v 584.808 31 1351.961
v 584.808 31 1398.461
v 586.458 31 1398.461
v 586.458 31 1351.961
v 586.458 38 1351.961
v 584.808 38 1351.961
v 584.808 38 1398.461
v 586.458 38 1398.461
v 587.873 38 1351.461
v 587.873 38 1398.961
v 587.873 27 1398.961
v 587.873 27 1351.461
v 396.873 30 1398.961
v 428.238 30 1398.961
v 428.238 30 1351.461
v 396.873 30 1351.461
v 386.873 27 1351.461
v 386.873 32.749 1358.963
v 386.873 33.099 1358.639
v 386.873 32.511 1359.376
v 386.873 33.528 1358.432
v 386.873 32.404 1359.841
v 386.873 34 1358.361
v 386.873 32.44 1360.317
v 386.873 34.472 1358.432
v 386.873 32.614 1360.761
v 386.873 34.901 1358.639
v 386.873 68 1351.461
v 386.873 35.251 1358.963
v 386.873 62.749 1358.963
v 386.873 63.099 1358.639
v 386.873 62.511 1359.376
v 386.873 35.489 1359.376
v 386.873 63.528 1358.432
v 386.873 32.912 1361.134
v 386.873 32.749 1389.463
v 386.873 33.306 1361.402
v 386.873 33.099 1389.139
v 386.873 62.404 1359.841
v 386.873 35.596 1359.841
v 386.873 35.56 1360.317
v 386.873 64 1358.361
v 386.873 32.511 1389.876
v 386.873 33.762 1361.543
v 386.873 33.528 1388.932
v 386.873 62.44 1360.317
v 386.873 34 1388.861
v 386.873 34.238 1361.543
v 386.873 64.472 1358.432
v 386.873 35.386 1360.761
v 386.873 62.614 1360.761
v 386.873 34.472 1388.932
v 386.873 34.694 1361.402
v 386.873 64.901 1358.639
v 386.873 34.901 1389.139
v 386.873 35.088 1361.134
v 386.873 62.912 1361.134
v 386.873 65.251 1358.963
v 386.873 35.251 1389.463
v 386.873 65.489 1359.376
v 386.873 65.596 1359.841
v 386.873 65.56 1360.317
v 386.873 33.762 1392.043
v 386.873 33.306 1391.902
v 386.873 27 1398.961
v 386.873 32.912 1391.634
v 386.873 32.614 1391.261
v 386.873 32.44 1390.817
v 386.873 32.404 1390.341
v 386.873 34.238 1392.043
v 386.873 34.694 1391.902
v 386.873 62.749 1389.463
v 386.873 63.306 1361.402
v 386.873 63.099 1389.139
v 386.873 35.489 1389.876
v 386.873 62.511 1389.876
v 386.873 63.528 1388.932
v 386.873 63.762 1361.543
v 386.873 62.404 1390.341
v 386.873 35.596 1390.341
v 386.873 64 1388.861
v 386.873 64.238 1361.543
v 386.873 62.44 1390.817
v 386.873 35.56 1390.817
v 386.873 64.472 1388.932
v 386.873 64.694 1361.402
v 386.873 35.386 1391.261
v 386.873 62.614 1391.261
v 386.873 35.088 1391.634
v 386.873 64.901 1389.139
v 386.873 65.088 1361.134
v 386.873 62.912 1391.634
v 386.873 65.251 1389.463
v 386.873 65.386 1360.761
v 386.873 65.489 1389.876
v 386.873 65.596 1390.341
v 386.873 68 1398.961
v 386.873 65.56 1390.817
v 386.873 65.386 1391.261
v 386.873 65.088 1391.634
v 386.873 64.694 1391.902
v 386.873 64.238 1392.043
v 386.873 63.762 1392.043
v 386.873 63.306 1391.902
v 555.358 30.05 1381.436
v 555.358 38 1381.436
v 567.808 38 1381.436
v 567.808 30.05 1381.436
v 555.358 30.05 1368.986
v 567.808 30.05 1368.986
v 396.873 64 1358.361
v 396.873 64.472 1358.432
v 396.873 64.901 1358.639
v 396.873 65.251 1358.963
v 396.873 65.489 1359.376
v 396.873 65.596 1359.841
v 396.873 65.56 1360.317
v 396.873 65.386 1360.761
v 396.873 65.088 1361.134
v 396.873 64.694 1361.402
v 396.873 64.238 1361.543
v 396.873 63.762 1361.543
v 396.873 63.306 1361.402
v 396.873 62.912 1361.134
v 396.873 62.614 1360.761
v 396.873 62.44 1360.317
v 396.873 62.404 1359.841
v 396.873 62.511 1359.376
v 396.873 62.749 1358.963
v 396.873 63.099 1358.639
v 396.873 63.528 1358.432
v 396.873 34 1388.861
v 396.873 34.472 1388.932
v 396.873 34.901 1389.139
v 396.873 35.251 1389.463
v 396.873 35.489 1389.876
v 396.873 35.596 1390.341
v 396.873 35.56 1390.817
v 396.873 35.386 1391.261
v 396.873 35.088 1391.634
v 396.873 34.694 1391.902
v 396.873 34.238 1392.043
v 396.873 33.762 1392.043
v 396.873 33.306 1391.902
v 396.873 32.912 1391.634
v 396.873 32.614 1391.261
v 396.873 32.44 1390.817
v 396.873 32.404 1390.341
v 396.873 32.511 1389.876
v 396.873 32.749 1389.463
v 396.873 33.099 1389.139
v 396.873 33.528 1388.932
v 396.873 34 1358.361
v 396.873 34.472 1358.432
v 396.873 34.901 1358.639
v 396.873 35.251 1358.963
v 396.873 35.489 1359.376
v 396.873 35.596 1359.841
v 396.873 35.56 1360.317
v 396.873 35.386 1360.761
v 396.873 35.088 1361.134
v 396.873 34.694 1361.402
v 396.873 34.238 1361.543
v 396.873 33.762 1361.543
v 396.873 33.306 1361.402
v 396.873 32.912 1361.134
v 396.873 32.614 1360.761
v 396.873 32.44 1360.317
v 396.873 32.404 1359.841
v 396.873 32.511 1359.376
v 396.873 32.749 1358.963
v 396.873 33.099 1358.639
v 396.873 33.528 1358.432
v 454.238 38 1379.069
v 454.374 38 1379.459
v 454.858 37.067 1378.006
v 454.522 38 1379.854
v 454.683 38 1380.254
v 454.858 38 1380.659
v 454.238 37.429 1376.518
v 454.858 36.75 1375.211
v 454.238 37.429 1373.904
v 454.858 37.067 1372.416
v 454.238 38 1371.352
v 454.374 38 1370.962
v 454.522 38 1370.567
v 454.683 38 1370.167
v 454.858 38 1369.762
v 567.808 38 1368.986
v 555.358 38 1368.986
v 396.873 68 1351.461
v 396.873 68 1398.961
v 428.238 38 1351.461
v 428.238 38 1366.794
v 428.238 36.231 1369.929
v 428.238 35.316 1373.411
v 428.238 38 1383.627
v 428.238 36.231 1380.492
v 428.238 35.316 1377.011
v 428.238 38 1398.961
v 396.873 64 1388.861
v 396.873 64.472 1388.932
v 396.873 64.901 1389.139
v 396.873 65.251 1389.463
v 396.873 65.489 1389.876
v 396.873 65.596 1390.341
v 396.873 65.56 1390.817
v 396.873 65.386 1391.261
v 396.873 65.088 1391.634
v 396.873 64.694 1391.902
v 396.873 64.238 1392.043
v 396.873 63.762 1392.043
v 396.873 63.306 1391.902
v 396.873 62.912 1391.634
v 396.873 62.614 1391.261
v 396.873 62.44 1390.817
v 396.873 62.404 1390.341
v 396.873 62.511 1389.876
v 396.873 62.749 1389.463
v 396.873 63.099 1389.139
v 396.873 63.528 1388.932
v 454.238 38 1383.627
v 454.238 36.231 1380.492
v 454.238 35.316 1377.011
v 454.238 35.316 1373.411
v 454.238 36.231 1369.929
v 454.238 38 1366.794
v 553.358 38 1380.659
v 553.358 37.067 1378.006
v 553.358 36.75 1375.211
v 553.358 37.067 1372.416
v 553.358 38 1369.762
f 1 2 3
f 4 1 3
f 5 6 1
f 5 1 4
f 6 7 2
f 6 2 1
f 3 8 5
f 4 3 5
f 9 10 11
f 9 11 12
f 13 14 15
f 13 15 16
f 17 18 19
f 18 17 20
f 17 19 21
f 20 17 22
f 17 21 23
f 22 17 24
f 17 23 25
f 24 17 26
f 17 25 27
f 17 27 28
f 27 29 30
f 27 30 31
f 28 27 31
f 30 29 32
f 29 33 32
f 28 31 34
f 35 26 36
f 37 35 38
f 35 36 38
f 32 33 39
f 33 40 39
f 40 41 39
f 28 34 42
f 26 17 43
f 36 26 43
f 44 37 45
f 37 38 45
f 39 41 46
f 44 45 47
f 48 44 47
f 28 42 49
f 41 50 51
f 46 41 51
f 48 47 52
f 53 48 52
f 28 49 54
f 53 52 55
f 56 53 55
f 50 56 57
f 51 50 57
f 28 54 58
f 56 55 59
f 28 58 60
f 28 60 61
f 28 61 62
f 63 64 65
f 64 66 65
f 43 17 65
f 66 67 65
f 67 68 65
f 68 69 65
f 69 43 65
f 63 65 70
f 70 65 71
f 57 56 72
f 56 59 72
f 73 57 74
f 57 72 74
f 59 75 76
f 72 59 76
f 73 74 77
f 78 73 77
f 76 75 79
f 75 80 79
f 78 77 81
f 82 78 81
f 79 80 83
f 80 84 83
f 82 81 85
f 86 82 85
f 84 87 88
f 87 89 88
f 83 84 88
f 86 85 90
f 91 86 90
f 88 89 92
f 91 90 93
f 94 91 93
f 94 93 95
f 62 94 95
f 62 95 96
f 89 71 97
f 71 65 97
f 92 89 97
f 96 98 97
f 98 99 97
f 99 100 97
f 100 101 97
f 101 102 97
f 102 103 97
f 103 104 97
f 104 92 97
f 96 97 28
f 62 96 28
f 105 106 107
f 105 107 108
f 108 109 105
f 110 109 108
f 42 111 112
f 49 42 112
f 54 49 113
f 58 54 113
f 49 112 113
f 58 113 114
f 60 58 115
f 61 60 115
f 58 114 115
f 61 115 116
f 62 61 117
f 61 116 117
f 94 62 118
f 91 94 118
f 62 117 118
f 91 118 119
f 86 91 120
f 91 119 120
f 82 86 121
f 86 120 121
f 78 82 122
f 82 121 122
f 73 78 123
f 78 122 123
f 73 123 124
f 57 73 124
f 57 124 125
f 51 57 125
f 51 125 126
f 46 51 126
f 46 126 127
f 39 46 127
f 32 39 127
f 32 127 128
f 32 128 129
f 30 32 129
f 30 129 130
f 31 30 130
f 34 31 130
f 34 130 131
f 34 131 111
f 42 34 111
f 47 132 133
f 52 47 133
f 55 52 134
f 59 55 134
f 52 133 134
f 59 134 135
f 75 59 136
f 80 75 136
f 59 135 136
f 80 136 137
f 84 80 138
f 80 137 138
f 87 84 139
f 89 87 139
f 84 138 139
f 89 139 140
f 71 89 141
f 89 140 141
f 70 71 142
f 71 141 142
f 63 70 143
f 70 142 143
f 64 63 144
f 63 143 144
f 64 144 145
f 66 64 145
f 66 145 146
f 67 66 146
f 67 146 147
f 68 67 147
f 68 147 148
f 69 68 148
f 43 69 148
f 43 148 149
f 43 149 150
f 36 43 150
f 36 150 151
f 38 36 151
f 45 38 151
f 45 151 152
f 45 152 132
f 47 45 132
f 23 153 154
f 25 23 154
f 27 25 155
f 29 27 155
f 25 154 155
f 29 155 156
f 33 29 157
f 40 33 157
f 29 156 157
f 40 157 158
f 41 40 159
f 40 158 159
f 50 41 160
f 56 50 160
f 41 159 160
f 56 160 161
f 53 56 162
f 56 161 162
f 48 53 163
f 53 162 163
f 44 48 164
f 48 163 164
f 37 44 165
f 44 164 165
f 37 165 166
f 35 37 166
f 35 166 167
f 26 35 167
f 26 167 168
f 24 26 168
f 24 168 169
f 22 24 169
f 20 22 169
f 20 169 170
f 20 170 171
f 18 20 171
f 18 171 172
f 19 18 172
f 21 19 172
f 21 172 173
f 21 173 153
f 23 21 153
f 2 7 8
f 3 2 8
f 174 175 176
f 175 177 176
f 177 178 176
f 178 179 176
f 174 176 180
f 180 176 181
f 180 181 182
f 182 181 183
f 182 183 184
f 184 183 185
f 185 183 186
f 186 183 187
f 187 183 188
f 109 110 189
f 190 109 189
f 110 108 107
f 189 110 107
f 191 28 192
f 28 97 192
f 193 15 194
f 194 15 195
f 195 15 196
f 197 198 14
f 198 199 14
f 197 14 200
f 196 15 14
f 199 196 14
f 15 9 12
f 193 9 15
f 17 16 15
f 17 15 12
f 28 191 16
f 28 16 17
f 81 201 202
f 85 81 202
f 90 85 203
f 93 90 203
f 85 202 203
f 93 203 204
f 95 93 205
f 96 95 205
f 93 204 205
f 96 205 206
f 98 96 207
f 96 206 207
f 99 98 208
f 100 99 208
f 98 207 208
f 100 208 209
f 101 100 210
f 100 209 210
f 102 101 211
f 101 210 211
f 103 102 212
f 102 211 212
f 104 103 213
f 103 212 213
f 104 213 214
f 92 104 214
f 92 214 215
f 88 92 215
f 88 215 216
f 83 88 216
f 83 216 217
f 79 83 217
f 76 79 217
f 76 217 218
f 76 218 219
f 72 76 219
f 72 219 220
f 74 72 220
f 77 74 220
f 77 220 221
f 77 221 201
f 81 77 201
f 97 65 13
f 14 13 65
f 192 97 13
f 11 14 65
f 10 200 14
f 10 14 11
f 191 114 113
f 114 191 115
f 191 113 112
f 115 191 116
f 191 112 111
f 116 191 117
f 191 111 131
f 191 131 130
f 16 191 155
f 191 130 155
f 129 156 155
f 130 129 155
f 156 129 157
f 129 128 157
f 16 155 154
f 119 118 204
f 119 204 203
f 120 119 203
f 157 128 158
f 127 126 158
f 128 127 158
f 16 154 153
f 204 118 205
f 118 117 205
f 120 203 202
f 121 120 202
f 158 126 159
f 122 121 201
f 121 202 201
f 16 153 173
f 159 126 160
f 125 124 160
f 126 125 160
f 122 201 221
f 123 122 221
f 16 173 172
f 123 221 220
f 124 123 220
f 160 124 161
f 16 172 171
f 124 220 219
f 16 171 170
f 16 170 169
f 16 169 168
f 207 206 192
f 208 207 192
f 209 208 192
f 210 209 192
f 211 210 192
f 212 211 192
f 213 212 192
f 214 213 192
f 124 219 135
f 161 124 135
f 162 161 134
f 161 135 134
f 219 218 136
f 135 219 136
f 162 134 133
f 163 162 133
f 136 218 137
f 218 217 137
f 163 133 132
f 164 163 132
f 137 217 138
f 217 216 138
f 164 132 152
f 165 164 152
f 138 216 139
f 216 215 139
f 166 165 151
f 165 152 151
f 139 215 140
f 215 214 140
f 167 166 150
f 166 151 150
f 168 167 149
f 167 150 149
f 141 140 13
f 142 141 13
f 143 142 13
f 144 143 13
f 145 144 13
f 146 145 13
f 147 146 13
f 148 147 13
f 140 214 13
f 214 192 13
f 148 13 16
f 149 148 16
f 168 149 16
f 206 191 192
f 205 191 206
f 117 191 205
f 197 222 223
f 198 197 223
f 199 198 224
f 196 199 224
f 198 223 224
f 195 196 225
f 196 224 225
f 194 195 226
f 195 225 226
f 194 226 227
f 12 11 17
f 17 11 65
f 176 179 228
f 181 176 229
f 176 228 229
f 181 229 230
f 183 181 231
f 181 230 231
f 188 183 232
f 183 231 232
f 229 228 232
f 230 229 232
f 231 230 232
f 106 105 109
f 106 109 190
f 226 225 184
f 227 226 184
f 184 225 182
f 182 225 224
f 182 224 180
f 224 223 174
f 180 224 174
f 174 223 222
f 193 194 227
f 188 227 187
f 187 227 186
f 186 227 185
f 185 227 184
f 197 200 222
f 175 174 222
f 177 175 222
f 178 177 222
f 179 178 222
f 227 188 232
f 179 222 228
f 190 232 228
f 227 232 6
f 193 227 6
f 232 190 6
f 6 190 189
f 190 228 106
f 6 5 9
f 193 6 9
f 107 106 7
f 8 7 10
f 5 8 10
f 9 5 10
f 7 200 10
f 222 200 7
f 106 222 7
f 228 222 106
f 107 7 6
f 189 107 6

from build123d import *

# Parameters (mm, degrees)
SKETCH1_W               = 226
SKETCH1_H               = 84
BOSS_EXTRUDE1_DEPTH     = 20
SKETCH9_W               = 215
SKETCH9_H               = 38.50000016
BOSS_EXTRUDE2_DEPTH     = 10
SKETCH12_W              = 10
SKETCH12_H              = 38.50000016
BOSS_EXTRUDE4_DEPTH     = 38
SKETCH14_R              = 1.6
CUT_EXTRUDE2_DEPTH      = 38
SKETCH18_W              = 173.6342166
SKETCH18_H              = 38.50000016
BOSS_EXTRUDE5_DEPTH     = 8
SKETCH20_W              = 226
SKETCH20_H              = 20
BOSS_EXTRUDE6_DEPTH     = 27.35
SKETCH20_4_W            = 226
SKETCH20_4_H            = 20
CUT_EXTRUDE3_DEPTH      = 27.35
SKETCH22_W              = 226
SKETCH22_H              = 20
CUT_EXTRUDE4_DEPTH      = 18.14670137
SKETCH23_W              = 38.50329863
SKETCH23_H              = 20
CUT_EXTRUDE5_DEPTH      = 11
SKETCH24_W              = 215
SKETCH24_H              = 38.50329863
CUT_EXTRUDE6_DEPTH      = 27
SKETCH27_W              = 31.3657834
SKETCH27_H              = 3
BOSS_EXTRUDE8_DEPTH     = 4.5
SKETCH28_W              = 31.3657834
SKETCH28_H              = 3
BOSS_EXTRUDE9_DEPTH     = 4.5
CUT_EXTRUDE9_DEPTH      = 5
CUT_EXTRUDE9_DEPTH_BACK = 14
SKETCH30_W              = 47.50000016
SKETCH30_H              = 11
CAVITY2_START           = 555.357736953
CAVITY2_DEPTH           = 12.45
CAVITY2_2_OUTLINE_W     = 9.75
CAVITY2_2_OUTLINE_H     = 10.05
CAVITY2_2_DEPTH         = 1.2
CAVITY2_START_2         = 566.607736953
CAVITY2_3_OUTLINE_W     = 9.75
CAVITY2_3_OUTLINE_H     = 10.05
CAVITY2_3_DEPTH         = 1.2
SKETCH32_W              = 10.05
SKETCH32_H              = 10.05
CUT_EXTRUDE14_DEPTH     = 10
SKETCH34_W              = 12.45
SKETCH34_H              = 12.45
BOSS_EXTRUDE11_DEPTH    = 3
SKETCH35_W              = 1.65
SKETCH35_H              = 46.5
CUT_EXTRUDE15_DEPTH     = 7


# Read off the part's stored shape, not the designer's step: Cavity2
with BuildPart() as part:
    # Sketch1 → Boss-Extrude1 (new body)
    with BuildSketch(Plane(origin=(375.872687737, 0, 1298.443562055), x_dir=(1, 0, 0), z_dir=(0, 1, 0))):
        with Locations((113, -81.370523073)):
            Rectangle(SKETCH1_W, SKETCH1_H)
    extrude(amount=BOSS_EXTRUDE1_DEPTH)

    # Sketch9 → Boss-Extrude2 (add)
    with BuildSketch(Plane(origin=(0, 20, 0), x_dir=(1, 0, 0), z_dir=(0, 1, 0))):
        with Locations((494.372687737, -1375.210786579)):
            Rectangle(SKETCH9_W, SKETCH9_H)
    extrude(amount=BOSS_EXTRUDE2_DEPTH)

    # Sketch12 → Boss-Extrude4 (add)
    with BuildSketch(Plane(origin=(0, 30, 0), x_dir=(1, 0, 0), z_dir=(0, 1, 0))):
        with Locations((391.872687737, -1375.210786579)):
            Rectangle(SKETCH12_W, SKETCH12_H)
    extrude(amount=BOSS_EXTRUDE4_DEPTH)

    # Sketch14 → Cut-Extrude2 (cut)
    with BuildSketch(Plane(origin=(396.872687737, 0, 0), x_dir=(0, 0, -1), z_dir=(1, 0, 0))):
        with Locations((-1390.460786659, 64)):
            Circle(SKETCH14_R)
        with Locations((-1359.960786499, 64)):
            Circle(SKETCH14_R)
        with Locations((-1390.460786659, 34)):
            Circle(SKETCH14_R)
        with Locations((-1359.960786499, 34)):
            Circle(SKETCH14_R)
    extrude(amount=-CUT_EXTRUDE2_DEPTH, mode=Mode.SUBTRACT)

    # Sketch18 → Boss-Extrude5 (add)
    with BuildSketch(Plane(origin=(0, 30, 0), x_dir=(1, 0, 0), z_dir=(0, 1, 0))):
        with Locations((515.055579437, -1375.210786579)):
            Rectangle(SKETCH18_W, SKETCH18_H)
    extrude(amount=BOSS_EXTRUDE5_DEPTH)

    # Sketch20 → Boss-Extrude6 (add)
    with BuildSketch(Plane.XY.offset(1421.814085128)):
        with Locations((488.872687737, 10)):
            Rectangle(SKETCH20_W, SKETCH20_H)
    extrude(amount=-BOSS_EXTRUDE6_DEPTH)

    # Sketch20<4> → Cut-Extrude3 (cut)
    with BuildSketch(Plane.XY.offset(1421.814085128)):
        with Locations((488.872687737, 10)):
            Rectangle(SKETCH20_4_W, SKETCH20_4_H)
    extrude(amount=-CUT_EXTRUDE3_DEPTH, mode=Mode.SUBTRACT)

    # Sketch22 → Cut-Extrude4 (cut)
    with BuildSketch(Plane(origin=(0, 0, 1337.814085128), x_dir=(-1, 0, 0), z_dir=(0, 0, -1))):
        with Locations((-488.872687737, 10)):
            Rectangle(SKETCH22_W, SKETCH22_H)
    extrude(amount=-CUT_EXTRUDE4_DEPTH, mode=Mode.SUBTRACT)

    # Sketch23 → Cut-Extrude5 (cut)
    with BuildSketch(Plane.ZY.offset(-375.872687737)):
        with Locations((1375.212435813, 10)):
            Rectangle(SKETCH23_W, SKETCH23_H)
    extrude(amount=-CUT_EXTRUDE5_DEPTH, mode=Mode.SUBTRACT)

    # Sketch24 → Cut-Extrude6 (cut)
    with BuildSketch(Plane.XZ):
        with Locations((494.372687737, 1375.212435813)):
            Rectangle(SKETCH24_W, SKETCH24_H)
    extrude(amount=-CUT_EXTRUDE6_DEPTH, mode=Mode.SUBTRACT)

    # Sketch27 → Boss-Extrude8 (add)
    with BuildSketch(Plane.XY.offset(1394.460786659)):
        Polygon((396.872687737, 68), (386.872687737, 68), (386.872687737, 27), (396.872687737, 27), (396.872687737, 30), align=None)
        with Locations((412.555579437, 28.5)):
            Rectangle(SKETCH27_W, SKETCH27_H)
        Polygon((428.238471137, 38), (428.238471137, 30), (428.238471137, 27), (601.872687737, 27), (601.872687737, 38), align=None)
    extrude(amount=BOSS_EXTRUDE8_DEPTH)

    # Sketch28 → Boss-Extrude9 (add)
    with BuildSketch(Plane(origin=(0, 0, 1355.960786499), x_dir=(-1, 0, 0), z_dir=(0, 0, -1))):
        Polygon((-428.238471137, 38), (-601.872687737, 38), (-601.872687737, 27), (-428.238471137, 27), (-428.238471137, 30), align=None)
        with Locations((-412.555579437, 28.5)):
            Rectangle(SKETCH28_W, SKETCH28_H)
        Polygon((-396.872687737, 68), (-396.872687737, 30), (-396.872687737, 27), (-386.872687737, 27), (-386.872687737, 68), align=None)
    extrude(amount=BOSS_EXTRUDE9_DEPTH)

    # Sketch30 → Cut-Extrude9 (cut, two sides: drawn at the far end of the back side and taken through both)
    with BuildSketch(Plane(origin=(601.872687737, 0, 0), x_dir=(0, 0, -1), z_dir=(1, 0, 0)).offset(-CUT_EXTRUDE9_DEPTH_BACK)):
        with Locations((-1375.210786579, 32.5)):
            Rectangle(SKETCH30_W, SKETCH30_H)
    extrude(amount=CUT_EXTRUDE9_DEPTH + CUT_EXTRUDE9_DEPTH_BACK, mode=Mode.SUBTRACT)

    # Cavity2 outline → Cavity2 (cut)
    with BuildSketch(Plane.YZ.offset(CAVITY2_START)):
        Polygon((27.05, 1368.985786659), (38, 1368.985786659), (38, 1370.185786659), (28.25, 1370.185786659), (28.25, 1380.235786659), (38, 1380.235786659), (38, 1381.435786659), (27.05, 1381.435786659), align=None)
    extrude(amount=CAVITY2_DEPTH, mode=Mode.SUBTRACT)

    # Cavity2 2 outline → Cavity2 2 (cut)
    with BuildSketch(Plane.YZ.offset(CAVITY2_START)):
        with Locations((33.125, 1375.210786659)):
            Rectangle(CAVITY2_2_OUTLINE_W, CAVITY2_2_OUTLINE_H)
    extrude(amount=CAVITY2_2_DEPTH, mode=Mode.SUBTRACT)

    # Cavity2 3 outline → Cavity2 3 (cut)
    with BuildSketch(Plane.YZ.offset(CAVITY2_START_2)):
        with Locations((33.125, 1375.210786659)):
            Rectangle(CAVITY2_3_OUTLINE_W, CAVITY2_3_OUTLINE_H)
    extrude(amount=CAVITY2_3_DEPTH, mode=Mode.SUBTRACT)

    # Cavity2 4 outline → Cavity2 4 (revolve, cut)
    with BuildSketch(Plane(origin=(0, 49.25, 1375.210786659), x_dir=(0, 1, 0), z_dir=(0, 0, -1))):
        Polygon((14.05, 428.238471137), (14.05, 454.238471137), (11.893245894, 454.238471137), (12.500000005, 454.857736959), (12.5, 553.357736953), (11.25, 553.357736953), (11.25, 428.238471137), align=None)
    revolve(axis=Axis((0, 49.25, 1375.210786659), (1, 0, 0)), mode=Mode.SUBTRACT)

    # Sketch32 → Cut-Extrude14 (cut)
    with BuildSketch(Plane(origin=(0, 38, 0), x_dir=(1, 0, 0), z_dir=(0, 1, 0))):
        with Locations((561.582736953, -1375.210786659)):
            Rectangle(SKETCH32_W, SKETCH32_H)
    extrude(amount=-CUT_EXTRUDE14_DEPTH, mode=Mode.SUBTRACT)

    # Sketch34 → Boss-Extrude11 (add)
    with BuildSketch(Plane(origin=(0, 27.05, 0), x_dir=(1, 0, 0), z_dir=(0, 1, 0))):
        with Locations((561.582736953, -1375.210786659)):
            Rectangle(SKETCH34_W, SKETCH34_H)
    extrude(amount=BOSS_EXTRUDE11_DEPTH)

    # Sketch35 → Cut-Extrude15 (cut)
    with BuildSketch(Plane(origin=(0, 38, 0), x_dir=(1, 0, 0), z_dir=(0, 1, 0))):
        with Locations((585.632736953, -1375.210786659)):
            Rectangle(SKETCH35_W, SKETCH35_H)
    extrude(amount=-CUT_EXTRUDE15_DEPTH, mode=Mode.SUBTRACT)


solid = part.part
